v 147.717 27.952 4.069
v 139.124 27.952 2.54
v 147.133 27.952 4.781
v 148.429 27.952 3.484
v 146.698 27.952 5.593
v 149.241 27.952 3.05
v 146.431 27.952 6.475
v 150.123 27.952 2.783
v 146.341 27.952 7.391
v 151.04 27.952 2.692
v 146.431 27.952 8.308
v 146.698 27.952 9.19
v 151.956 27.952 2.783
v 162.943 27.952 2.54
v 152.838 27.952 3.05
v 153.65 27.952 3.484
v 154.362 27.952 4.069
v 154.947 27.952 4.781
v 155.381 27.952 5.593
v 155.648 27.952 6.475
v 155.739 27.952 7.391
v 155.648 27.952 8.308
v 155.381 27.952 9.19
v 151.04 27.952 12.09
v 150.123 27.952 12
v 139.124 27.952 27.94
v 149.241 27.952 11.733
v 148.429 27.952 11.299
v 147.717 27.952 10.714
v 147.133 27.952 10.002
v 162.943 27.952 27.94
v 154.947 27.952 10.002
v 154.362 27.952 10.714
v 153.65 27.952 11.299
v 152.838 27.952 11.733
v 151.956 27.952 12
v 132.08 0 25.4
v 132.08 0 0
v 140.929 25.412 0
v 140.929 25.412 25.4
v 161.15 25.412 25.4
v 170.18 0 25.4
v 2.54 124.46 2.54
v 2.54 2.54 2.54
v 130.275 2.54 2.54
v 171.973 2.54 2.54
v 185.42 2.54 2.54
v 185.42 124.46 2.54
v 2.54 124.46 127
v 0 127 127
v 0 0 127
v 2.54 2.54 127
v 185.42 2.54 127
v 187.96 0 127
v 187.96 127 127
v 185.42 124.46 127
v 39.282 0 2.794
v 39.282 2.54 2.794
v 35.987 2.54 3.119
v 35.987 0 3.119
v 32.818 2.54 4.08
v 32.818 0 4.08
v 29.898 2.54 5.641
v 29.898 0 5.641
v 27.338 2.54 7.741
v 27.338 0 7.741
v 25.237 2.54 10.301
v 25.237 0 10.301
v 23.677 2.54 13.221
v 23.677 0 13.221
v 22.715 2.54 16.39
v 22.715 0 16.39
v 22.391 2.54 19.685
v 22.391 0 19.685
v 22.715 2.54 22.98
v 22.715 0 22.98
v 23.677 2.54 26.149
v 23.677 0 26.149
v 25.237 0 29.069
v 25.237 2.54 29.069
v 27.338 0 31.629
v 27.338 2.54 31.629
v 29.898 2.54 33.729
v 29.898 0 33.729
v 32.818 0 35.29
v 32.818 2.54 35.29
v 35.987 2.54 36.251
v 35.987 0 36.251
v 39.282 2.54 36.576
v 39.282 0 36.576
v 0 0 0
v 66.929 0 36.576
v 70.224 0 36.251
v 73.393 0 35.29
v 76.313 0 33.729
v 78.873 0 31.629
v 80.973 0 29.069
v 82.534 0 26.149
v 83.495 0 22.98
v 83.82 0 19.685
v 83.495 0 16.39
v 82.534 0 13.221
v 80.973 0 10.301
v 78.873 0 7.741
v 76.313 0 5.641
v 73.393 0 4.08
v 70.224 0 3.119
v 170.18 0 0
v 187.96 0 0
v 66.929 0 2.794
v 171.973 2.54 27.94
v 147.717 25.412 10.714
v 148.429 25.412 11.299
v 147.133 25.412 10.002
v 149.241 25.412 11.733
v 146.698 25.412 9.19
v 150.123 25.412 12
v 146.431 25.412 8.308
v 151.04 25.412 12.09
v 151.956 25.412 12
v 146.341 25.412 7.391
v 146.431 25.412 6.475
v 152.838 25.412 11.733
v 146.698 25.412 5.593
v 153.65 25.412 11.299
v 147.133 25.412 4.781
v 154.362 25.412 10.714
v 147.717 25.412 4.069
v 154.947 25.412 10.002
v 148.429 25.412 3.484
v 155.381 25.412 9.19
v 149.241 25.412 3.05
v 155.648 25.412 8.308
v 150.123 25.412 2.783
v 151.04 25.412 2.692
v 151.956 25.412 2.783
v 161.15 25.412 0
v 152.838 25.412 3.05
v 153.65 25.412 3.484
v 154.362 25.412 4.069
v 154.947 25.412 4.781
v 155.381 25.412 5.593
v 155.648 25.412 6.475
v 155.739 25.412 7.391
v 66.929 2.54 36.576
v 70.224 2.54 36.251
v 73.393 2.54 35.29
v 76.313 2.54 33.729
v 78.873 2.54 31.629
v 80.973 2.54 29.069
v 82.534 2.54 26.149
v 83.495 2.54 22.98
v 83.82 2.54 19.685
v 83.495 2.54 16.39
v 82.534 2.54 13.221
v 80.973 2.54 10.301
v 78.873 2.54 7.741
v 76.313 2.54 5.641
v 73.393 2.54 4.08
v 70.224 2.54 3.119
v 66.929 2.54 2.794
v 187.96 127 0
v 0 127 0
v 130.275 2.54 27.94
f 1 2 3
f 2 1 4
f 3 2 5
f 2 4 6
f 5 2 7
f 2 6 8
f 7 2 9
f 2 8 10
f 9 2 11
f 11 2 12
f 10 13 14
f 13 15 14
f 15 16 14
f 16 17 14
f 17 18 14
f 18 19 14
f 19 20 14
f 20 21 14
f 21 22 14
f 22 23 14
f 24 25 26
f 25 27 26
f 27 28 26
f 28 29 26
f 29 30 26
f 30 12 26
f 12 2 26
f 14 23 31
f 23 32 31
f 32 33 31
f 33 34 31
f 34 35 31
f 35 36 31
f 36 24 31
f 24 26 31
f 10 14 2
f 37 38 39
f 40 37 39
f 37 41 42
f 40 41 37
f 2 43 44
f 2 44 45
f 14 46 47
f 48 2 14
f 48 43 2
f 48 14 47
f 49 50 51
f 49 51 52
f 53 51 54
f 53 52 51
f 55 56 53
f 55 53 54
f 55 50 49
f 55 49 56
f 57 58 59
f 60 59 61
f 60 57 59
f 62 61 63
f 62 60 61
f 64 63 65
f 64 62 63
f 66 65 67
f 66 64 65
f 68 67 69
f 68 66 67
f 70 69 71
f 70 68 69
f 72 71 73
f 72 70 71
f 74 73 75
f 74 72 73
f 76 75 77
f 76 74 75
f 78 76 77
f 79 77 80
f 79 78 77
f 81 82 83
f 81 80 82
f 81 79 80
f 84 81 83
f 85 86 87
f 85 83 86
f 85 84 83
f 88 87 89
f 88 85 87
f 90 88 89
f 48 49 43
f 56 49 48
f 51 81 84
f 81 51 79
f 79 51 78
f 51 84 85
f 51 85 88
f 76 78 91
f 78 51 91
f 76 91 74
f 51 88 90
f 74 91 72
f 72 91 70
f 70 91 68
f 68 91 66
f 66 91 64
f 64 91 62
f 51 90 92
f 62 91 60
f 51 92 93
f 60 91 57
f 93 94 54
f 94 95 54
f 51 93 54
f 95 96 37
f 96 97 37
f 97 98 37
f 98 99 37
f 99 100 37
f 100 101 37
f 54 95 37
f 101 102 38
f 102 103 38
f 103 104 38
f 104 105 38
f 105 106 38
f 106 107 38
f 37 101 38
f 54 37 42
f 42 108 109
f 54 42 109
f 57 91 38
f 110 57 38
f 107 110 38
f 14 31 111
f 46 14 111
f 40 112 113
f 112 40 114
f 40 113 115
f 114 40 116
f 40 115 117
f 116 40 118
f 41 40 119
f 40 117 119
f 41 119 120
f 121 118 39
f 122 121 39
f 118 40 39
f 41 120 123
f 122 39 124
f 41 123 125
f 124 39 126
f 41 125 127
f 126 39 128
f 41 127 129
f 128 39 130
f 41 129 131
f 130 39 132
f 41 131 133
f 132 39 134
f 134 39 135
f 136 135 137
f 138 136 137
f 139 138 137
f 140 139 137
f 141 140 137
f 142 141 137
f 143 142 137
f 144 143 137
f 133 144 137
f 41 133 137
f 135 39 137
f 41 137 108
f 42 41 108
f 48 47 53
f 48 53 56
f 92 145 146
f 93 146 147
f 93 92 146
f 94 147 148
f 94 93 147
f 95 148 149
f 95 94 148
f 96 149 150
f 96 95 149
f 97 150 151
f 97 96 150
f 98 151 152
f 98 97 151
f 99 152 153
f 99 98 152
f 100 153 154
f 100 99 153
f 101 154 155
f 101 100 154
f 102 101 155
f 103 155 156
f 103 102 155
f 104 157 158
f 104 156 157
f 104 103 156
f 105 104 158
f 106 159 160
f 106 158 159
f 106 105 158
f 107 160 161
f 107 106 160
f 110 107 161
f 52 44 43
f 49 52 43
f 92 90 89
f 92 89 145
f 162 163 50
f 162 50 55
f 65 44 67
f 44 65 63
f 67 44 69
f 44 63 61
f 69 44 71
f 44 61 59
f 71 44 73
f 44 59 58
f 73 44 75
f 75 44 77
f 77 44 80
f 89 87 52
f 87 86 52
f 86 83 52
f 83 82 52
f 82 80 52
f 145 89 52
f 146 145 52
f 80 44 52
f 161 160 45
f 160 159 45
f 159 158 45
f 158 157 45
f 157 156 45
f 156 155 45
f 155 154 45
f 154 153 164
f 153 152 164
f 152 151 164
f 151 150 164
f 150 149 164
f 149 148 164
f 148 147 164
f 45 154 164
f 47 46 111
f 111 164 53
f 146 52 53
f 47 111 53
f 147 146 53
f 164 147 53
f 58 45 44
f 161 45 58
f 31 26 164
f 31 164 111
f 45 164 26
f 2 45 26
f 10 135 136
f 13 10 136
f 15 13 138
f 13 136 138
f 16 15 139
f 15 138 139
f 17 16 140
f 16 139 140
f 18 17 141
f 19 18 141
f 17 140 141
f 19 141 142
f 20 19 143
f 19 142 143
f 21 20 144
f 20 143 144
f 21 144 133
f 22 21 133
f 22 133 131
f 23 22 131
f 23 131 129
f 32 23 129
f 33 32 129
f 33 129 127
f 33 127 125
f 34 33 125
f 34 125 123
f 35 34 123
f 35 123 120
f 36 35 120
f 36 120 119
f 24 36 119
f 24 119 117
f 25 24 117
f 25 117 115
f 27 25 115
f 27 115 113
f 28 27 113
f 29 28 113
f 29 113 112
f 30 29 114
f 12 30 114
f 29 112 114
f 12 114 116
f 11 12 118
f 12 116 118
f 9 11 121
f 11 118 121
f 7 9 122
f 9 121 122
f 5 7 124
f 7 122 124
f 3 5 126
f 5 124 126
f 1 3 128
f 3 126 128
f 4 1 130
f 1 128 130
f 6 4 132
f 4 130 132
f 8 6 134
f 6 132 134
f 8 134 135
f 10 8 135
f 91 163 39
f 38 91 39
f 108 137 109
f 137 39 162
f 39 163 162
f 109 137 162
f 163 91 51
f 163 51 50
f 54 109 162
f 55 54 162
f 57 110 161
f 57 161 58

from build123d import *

# Parameters (mm, degrees)
SKETCH1_W           = 187.96
SKETCH1_H           = 127
BOSS_EXTRUDE1_DEPTH = 127
CUT_EXTRUDE1_DEPTH  = 25.4
SKETCH6_R           = 4.699
CUT_EXTRUDE2_DEPTH  = 12.7
SKETCH7_W           = 182.88
SKETCH7_H           = 121.92
CUT_EXTRUDE4_DEPTH  = 99.06
CUT_EXTRUDE5_DEPTH  = 25.4
CUT_EXTRUDE6_DEPTH  = 3.048


with BuildPart() as part:
    # Sketch1 → Boss-Extrude1 (new body)
    with BuildSketch(Plane.XY):
        with Locations((93.98, 63.5)):
            Rectangle(SKETCH1_W, SKETCH1_H)
    extrude(amount=BOSS_EXTRUDE1_DEPTH)

    # Sketch3 → Cut-Extrude1 (cut)
    with BuildSketch(Plane(origin=(0, 0, 0), x_dir=(-1, 0, 0), z_dir=(0, 0, -1))):
        Polygon((-170.18, 0), (-132.08, 0), (-140.929239756, 25.412400336), (-161.150123966, 25.412400336), align=None)
    extrude(amount=-CUT_EXTRUDE1_DEPTH, mode=Mode.SUBTRACT)

    # Sketch6 → Cut-Extrude2 (cut)
    with BuildSketch(Plane.XZ.offset(-25.412400336)):
        with Locations(Location((151.039681861, 7.391433819, 0), (0, 0, 270))):
            Circle(SKETCH6_R)
    extrude(amount=-CUT_EXTRUDE2_DEPTH, mode=Mode.SUBTRACT)

    # Sketch7 → Cut-Extrude4 (cut)
    with BuildSketch(Plane.XY.offset(127)):
        with Locations((93.98, 63.5)):
            Rectangle(SKETCH7_W, SKETCH7_H)
    extrude(amount=-CUT_EXTRUDE4_DEPTH, mode=Mode.SUBTRACT)

    # Sketch9 → Cut-Extrude5 (cut)
    with BuildSketch(Plane.XY.offset(27.94)):
        Polygon((162.943164317, 27.952400336), (171.973040351, 2.54), (185.42, 2.54), (185.42, 124.46), (2.54, 124.46), (2.54, 2.54), (130.274896212, 2.54), (139.124135968, 27.952400336), align=None)
    extrude(amount=-CUT_EXTRUDE5_DEPTH, mode=Mode.SUBTRACT)

    # Sketch10 → Cut-Extrude6 (cut)
    with BuildSketch(Plane.XZ):
        with BuildLine():
            Line((39.281842654, 36.576), (66.929, 36.576))
            ThreePointArc((66.929, 36.576), (83.82, 19.685), (66.929, 2.794))
            Line((66.929, 2.794), (39.281842654, 2.794))
            ThreePointArc((39.281842654, 2.794), (22.390842654, 19.685), (39.281842654, 36.576))
        make_face()
    extrude(amount=-CUT_EXTRUDE6_DEPTH, mode=Mode.SUBTRACT)


solid = part.part
